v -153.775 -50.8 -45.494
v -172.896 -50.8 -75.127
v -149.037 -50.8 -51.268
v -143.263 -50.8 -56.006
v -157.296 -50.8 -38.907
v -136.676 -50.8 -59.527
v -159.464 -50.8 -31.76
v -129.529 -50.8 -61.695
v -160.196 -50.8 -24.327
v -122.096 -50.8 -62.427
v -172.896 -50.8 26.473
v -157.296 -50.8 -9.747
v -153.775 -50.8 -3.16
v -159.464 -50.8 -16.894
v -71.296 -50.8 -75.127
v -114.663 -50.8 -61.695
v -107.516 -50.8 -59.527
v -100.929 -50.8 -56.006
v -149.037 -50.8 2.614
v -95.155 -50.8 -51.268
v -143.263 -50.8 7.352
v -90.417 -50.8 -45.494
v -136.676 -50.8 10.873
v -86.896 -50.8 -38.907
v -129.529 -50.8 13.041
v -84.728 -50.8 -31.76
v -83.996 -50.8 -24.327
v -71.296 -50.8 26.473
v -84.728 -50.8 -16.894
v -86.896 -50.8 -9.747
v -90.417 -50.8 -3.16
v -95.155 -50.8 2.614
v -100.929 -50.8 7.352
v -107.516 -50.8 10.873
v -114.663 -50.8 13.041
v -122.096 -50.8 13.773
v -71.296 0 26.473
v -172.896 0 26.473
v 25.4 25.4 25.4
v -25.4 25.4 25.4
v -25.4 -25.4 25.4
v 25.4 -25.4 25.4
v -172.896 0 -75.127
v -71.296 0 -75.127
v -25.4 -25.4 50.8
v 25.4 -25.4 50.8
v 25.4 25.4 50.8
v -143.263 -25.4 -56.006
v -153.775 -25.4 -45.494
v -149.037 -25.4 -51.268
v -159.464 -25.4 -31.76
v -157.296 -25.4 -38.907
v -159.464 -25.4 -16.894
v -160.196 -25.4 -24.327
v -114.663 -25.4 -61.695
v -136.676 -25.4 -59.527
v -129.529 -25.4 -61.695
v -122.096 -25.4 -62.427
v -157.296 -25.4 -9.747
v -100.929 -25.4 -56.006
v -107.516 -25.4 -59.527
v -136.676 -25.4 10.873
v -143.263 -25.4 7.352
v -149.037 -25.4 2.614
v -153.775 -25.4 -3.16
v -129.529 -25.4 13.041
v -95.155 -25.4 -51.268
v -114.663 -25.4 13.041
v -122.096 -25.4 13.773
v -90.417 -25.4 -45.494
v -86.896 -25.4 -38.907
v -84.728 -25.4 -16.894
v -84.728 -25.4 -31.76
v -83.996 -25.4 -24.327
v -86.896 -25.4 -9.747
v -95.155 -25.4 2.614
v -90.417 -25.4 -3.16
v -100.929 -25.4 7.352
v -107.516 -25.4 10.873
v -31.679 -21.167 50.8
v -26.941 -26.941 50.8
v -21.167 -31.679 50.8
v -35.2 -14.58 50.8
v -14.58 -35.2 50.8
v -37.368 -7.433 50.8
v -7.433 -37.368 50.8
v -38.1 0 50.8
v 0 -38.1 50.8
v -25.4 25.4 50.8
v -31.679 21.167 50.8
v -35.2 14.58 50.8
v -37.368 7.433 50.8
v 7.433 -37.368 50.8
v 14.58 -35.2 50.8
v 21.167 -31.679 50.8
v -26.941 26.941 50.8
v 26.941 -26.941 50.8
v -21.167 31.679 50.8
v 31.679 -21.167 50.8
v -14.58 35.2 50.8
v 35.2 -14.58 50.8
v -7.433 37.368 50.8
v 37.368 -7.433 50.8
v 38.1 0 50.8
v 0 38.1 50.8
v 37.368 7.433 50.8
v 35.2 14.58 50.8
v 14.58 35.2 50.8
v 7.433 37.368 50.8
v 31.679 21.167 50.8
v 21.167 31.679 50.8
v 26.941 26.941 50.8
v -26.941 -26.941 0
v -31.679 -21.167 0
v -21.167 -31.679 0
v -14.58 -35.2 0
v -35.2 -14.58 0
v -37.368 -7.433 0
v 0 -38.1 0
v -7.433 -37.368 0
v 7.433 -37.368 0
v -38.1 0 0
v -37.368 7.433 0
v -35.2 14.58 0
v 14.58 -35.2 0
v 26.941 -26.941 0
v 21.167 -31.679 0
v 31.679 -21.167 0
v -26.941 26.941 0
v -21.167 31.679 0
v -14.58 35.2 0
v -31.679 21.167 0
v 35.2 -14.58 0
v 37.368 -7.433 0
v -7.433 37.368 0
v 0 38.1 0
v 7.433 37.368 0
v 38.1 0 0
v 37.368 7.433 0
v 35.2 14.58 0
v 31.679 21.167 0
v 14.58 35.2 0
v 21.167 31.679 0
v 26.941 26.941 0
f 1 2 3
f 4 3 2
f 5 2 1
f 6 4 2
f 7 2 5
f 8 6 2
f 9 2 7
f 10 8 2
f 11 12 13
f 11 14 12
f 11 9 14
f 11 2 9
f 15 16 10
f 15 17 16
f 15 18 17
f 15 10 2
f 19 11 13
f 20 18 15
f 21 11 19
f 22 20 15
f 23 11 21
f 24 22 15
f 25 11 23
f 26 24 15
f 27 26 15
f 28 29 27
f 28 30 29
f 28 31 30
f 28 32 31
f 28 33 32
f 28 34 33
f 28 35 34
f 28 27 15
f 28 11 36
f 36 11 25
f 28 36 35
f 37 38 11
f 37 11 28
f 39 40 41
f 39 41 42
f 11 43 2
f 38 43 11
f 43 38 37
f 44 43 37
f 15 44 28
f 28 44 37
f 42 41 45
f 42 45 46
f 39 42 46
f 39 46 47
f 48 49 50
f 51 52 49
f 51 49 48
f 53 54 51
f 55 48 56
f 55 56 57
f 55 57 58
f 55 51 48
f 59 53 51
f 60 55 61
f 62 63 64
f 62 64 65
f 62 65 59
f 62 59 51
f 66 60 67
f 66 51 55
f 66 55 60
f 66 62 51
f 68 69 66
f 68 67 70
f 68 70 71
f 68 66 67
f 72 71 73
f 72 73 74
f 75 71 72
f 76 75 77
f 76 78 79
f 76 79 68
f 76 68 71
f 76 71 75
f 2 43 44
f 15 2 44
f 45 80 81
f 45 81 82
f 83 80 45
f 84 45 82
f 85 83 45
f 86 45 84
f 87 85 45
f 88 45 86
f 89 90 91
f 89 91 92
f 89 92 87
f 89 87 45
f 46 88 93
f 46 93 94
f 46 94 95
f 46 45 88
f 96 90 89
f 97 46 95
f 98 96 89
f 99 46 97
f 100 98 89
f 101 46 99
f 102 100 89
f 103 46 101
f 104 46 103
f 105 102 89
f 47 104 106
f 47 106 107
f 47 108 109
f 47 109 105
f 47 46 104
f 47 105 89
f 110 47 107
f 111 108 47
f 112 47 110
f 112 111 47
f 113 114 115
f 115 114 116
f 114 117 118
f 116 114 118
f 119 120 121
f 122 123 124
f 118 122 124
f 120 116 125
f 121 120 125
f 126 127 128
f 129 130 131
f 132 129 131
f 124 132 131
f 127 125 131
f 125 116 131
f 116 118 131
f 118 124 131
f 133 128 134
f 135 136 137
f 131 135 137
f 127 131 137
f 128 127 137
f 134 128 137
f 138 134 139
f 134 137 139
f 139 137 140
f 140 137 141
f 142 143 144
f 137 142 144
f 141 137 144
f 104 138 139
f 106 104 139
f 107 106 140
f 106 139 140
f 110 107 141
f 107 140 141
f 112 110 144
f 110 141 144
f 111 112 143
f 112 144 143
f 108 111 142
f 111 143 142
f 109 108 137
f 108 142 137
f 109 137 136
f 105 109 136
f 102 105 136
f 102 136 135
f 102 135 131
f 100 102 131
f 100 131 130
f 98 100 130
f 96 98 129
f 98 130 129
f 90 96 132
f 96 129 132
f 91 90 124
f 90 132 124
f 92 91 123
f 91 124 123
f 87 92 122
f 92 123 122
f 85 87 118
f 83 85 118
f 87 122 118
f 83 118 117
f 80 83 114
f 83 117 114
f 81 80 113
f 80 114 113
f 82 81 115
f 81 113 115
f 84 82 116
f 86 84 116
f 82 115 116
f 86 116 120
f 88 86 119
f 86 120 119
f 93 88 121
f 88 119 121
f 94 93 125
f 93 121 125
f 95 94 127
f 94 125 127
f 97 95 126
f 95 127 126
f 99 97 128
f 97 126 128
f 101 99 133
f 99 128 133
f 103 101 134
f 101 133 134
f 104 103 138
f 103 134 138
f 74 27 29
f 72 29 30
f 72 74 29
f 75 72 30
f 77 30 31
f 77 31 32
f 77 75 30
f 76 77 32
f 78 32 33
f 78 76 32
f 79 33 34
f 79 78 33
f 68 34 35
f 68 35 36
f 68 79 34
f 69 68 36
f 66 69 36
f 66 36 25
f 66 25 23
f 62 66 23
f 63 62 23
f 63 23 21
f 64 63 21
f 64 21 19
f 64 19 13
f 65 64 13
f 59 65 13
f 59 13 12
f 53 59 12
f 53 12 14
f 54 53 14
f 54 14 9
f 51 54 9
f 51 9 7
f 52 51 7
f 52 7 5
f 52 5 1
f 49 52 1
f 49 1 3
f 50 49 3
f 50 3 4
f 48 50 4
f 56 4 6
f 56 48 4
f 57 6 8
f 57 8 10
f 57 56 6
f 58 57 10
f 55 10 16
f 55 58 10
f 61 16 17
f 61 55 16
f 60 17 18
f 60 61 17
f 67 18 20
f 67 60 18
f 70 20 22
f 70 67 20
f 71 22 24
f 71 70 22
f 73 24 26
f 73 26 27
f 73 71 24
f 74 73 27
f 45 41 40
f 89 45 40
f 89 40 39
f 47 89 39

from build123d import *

# Parameters (mm, degrees)
F0_R     = 38.1
F0_W     = 50.8
F0_H     = 50.8
F1_DEPTH = 50.8
F2_DEPTH = 25.4
F3_W     = 101.6
F3_H     = 101.6
F3_R     = 38.1
F4_DEPTH = 50.8
F5_DEPTH = 25.4


with BuildPart() as f1:
    # F0 (on Top) → F1 (new body)
    with BuildSketch(Plane.XY):
        Circle(F0_R)
        Rectangle(F0_W, F0_H, mode=Mode.SUBTRACT)
    extrude(amount=F1_DEPTH)

    # F0 (on Top) → F2 (join)
    with BuildSketch(Plane.XY):
        Rectangle(F0_W, F0_H)
    extrude(amount=F2_DEPTH)


with BuildPart() as f4:
    # F3 (on Front) → F4 (new body)
    with BuildSketch(Plane.XZ):
        with Locations((-122.096188, -24.32674)):
            Rectangle(F3_W, F3_H)
        with Locations((-122.096188, -24.32674)):
            Circle(F3_R, mode=Mode.SUBTRACT)
    extrude(amount=F4_DEPTH)

    # F3 (on Front) → F5 (join)
    with BuildSketch(Plane.XZ):
        with Locations((-122.096188, -24.32674)):
            Circle(F3_R)
    extrude(amount=F5_DEPTH)


solid = Compound([f1.part, f4.part])
